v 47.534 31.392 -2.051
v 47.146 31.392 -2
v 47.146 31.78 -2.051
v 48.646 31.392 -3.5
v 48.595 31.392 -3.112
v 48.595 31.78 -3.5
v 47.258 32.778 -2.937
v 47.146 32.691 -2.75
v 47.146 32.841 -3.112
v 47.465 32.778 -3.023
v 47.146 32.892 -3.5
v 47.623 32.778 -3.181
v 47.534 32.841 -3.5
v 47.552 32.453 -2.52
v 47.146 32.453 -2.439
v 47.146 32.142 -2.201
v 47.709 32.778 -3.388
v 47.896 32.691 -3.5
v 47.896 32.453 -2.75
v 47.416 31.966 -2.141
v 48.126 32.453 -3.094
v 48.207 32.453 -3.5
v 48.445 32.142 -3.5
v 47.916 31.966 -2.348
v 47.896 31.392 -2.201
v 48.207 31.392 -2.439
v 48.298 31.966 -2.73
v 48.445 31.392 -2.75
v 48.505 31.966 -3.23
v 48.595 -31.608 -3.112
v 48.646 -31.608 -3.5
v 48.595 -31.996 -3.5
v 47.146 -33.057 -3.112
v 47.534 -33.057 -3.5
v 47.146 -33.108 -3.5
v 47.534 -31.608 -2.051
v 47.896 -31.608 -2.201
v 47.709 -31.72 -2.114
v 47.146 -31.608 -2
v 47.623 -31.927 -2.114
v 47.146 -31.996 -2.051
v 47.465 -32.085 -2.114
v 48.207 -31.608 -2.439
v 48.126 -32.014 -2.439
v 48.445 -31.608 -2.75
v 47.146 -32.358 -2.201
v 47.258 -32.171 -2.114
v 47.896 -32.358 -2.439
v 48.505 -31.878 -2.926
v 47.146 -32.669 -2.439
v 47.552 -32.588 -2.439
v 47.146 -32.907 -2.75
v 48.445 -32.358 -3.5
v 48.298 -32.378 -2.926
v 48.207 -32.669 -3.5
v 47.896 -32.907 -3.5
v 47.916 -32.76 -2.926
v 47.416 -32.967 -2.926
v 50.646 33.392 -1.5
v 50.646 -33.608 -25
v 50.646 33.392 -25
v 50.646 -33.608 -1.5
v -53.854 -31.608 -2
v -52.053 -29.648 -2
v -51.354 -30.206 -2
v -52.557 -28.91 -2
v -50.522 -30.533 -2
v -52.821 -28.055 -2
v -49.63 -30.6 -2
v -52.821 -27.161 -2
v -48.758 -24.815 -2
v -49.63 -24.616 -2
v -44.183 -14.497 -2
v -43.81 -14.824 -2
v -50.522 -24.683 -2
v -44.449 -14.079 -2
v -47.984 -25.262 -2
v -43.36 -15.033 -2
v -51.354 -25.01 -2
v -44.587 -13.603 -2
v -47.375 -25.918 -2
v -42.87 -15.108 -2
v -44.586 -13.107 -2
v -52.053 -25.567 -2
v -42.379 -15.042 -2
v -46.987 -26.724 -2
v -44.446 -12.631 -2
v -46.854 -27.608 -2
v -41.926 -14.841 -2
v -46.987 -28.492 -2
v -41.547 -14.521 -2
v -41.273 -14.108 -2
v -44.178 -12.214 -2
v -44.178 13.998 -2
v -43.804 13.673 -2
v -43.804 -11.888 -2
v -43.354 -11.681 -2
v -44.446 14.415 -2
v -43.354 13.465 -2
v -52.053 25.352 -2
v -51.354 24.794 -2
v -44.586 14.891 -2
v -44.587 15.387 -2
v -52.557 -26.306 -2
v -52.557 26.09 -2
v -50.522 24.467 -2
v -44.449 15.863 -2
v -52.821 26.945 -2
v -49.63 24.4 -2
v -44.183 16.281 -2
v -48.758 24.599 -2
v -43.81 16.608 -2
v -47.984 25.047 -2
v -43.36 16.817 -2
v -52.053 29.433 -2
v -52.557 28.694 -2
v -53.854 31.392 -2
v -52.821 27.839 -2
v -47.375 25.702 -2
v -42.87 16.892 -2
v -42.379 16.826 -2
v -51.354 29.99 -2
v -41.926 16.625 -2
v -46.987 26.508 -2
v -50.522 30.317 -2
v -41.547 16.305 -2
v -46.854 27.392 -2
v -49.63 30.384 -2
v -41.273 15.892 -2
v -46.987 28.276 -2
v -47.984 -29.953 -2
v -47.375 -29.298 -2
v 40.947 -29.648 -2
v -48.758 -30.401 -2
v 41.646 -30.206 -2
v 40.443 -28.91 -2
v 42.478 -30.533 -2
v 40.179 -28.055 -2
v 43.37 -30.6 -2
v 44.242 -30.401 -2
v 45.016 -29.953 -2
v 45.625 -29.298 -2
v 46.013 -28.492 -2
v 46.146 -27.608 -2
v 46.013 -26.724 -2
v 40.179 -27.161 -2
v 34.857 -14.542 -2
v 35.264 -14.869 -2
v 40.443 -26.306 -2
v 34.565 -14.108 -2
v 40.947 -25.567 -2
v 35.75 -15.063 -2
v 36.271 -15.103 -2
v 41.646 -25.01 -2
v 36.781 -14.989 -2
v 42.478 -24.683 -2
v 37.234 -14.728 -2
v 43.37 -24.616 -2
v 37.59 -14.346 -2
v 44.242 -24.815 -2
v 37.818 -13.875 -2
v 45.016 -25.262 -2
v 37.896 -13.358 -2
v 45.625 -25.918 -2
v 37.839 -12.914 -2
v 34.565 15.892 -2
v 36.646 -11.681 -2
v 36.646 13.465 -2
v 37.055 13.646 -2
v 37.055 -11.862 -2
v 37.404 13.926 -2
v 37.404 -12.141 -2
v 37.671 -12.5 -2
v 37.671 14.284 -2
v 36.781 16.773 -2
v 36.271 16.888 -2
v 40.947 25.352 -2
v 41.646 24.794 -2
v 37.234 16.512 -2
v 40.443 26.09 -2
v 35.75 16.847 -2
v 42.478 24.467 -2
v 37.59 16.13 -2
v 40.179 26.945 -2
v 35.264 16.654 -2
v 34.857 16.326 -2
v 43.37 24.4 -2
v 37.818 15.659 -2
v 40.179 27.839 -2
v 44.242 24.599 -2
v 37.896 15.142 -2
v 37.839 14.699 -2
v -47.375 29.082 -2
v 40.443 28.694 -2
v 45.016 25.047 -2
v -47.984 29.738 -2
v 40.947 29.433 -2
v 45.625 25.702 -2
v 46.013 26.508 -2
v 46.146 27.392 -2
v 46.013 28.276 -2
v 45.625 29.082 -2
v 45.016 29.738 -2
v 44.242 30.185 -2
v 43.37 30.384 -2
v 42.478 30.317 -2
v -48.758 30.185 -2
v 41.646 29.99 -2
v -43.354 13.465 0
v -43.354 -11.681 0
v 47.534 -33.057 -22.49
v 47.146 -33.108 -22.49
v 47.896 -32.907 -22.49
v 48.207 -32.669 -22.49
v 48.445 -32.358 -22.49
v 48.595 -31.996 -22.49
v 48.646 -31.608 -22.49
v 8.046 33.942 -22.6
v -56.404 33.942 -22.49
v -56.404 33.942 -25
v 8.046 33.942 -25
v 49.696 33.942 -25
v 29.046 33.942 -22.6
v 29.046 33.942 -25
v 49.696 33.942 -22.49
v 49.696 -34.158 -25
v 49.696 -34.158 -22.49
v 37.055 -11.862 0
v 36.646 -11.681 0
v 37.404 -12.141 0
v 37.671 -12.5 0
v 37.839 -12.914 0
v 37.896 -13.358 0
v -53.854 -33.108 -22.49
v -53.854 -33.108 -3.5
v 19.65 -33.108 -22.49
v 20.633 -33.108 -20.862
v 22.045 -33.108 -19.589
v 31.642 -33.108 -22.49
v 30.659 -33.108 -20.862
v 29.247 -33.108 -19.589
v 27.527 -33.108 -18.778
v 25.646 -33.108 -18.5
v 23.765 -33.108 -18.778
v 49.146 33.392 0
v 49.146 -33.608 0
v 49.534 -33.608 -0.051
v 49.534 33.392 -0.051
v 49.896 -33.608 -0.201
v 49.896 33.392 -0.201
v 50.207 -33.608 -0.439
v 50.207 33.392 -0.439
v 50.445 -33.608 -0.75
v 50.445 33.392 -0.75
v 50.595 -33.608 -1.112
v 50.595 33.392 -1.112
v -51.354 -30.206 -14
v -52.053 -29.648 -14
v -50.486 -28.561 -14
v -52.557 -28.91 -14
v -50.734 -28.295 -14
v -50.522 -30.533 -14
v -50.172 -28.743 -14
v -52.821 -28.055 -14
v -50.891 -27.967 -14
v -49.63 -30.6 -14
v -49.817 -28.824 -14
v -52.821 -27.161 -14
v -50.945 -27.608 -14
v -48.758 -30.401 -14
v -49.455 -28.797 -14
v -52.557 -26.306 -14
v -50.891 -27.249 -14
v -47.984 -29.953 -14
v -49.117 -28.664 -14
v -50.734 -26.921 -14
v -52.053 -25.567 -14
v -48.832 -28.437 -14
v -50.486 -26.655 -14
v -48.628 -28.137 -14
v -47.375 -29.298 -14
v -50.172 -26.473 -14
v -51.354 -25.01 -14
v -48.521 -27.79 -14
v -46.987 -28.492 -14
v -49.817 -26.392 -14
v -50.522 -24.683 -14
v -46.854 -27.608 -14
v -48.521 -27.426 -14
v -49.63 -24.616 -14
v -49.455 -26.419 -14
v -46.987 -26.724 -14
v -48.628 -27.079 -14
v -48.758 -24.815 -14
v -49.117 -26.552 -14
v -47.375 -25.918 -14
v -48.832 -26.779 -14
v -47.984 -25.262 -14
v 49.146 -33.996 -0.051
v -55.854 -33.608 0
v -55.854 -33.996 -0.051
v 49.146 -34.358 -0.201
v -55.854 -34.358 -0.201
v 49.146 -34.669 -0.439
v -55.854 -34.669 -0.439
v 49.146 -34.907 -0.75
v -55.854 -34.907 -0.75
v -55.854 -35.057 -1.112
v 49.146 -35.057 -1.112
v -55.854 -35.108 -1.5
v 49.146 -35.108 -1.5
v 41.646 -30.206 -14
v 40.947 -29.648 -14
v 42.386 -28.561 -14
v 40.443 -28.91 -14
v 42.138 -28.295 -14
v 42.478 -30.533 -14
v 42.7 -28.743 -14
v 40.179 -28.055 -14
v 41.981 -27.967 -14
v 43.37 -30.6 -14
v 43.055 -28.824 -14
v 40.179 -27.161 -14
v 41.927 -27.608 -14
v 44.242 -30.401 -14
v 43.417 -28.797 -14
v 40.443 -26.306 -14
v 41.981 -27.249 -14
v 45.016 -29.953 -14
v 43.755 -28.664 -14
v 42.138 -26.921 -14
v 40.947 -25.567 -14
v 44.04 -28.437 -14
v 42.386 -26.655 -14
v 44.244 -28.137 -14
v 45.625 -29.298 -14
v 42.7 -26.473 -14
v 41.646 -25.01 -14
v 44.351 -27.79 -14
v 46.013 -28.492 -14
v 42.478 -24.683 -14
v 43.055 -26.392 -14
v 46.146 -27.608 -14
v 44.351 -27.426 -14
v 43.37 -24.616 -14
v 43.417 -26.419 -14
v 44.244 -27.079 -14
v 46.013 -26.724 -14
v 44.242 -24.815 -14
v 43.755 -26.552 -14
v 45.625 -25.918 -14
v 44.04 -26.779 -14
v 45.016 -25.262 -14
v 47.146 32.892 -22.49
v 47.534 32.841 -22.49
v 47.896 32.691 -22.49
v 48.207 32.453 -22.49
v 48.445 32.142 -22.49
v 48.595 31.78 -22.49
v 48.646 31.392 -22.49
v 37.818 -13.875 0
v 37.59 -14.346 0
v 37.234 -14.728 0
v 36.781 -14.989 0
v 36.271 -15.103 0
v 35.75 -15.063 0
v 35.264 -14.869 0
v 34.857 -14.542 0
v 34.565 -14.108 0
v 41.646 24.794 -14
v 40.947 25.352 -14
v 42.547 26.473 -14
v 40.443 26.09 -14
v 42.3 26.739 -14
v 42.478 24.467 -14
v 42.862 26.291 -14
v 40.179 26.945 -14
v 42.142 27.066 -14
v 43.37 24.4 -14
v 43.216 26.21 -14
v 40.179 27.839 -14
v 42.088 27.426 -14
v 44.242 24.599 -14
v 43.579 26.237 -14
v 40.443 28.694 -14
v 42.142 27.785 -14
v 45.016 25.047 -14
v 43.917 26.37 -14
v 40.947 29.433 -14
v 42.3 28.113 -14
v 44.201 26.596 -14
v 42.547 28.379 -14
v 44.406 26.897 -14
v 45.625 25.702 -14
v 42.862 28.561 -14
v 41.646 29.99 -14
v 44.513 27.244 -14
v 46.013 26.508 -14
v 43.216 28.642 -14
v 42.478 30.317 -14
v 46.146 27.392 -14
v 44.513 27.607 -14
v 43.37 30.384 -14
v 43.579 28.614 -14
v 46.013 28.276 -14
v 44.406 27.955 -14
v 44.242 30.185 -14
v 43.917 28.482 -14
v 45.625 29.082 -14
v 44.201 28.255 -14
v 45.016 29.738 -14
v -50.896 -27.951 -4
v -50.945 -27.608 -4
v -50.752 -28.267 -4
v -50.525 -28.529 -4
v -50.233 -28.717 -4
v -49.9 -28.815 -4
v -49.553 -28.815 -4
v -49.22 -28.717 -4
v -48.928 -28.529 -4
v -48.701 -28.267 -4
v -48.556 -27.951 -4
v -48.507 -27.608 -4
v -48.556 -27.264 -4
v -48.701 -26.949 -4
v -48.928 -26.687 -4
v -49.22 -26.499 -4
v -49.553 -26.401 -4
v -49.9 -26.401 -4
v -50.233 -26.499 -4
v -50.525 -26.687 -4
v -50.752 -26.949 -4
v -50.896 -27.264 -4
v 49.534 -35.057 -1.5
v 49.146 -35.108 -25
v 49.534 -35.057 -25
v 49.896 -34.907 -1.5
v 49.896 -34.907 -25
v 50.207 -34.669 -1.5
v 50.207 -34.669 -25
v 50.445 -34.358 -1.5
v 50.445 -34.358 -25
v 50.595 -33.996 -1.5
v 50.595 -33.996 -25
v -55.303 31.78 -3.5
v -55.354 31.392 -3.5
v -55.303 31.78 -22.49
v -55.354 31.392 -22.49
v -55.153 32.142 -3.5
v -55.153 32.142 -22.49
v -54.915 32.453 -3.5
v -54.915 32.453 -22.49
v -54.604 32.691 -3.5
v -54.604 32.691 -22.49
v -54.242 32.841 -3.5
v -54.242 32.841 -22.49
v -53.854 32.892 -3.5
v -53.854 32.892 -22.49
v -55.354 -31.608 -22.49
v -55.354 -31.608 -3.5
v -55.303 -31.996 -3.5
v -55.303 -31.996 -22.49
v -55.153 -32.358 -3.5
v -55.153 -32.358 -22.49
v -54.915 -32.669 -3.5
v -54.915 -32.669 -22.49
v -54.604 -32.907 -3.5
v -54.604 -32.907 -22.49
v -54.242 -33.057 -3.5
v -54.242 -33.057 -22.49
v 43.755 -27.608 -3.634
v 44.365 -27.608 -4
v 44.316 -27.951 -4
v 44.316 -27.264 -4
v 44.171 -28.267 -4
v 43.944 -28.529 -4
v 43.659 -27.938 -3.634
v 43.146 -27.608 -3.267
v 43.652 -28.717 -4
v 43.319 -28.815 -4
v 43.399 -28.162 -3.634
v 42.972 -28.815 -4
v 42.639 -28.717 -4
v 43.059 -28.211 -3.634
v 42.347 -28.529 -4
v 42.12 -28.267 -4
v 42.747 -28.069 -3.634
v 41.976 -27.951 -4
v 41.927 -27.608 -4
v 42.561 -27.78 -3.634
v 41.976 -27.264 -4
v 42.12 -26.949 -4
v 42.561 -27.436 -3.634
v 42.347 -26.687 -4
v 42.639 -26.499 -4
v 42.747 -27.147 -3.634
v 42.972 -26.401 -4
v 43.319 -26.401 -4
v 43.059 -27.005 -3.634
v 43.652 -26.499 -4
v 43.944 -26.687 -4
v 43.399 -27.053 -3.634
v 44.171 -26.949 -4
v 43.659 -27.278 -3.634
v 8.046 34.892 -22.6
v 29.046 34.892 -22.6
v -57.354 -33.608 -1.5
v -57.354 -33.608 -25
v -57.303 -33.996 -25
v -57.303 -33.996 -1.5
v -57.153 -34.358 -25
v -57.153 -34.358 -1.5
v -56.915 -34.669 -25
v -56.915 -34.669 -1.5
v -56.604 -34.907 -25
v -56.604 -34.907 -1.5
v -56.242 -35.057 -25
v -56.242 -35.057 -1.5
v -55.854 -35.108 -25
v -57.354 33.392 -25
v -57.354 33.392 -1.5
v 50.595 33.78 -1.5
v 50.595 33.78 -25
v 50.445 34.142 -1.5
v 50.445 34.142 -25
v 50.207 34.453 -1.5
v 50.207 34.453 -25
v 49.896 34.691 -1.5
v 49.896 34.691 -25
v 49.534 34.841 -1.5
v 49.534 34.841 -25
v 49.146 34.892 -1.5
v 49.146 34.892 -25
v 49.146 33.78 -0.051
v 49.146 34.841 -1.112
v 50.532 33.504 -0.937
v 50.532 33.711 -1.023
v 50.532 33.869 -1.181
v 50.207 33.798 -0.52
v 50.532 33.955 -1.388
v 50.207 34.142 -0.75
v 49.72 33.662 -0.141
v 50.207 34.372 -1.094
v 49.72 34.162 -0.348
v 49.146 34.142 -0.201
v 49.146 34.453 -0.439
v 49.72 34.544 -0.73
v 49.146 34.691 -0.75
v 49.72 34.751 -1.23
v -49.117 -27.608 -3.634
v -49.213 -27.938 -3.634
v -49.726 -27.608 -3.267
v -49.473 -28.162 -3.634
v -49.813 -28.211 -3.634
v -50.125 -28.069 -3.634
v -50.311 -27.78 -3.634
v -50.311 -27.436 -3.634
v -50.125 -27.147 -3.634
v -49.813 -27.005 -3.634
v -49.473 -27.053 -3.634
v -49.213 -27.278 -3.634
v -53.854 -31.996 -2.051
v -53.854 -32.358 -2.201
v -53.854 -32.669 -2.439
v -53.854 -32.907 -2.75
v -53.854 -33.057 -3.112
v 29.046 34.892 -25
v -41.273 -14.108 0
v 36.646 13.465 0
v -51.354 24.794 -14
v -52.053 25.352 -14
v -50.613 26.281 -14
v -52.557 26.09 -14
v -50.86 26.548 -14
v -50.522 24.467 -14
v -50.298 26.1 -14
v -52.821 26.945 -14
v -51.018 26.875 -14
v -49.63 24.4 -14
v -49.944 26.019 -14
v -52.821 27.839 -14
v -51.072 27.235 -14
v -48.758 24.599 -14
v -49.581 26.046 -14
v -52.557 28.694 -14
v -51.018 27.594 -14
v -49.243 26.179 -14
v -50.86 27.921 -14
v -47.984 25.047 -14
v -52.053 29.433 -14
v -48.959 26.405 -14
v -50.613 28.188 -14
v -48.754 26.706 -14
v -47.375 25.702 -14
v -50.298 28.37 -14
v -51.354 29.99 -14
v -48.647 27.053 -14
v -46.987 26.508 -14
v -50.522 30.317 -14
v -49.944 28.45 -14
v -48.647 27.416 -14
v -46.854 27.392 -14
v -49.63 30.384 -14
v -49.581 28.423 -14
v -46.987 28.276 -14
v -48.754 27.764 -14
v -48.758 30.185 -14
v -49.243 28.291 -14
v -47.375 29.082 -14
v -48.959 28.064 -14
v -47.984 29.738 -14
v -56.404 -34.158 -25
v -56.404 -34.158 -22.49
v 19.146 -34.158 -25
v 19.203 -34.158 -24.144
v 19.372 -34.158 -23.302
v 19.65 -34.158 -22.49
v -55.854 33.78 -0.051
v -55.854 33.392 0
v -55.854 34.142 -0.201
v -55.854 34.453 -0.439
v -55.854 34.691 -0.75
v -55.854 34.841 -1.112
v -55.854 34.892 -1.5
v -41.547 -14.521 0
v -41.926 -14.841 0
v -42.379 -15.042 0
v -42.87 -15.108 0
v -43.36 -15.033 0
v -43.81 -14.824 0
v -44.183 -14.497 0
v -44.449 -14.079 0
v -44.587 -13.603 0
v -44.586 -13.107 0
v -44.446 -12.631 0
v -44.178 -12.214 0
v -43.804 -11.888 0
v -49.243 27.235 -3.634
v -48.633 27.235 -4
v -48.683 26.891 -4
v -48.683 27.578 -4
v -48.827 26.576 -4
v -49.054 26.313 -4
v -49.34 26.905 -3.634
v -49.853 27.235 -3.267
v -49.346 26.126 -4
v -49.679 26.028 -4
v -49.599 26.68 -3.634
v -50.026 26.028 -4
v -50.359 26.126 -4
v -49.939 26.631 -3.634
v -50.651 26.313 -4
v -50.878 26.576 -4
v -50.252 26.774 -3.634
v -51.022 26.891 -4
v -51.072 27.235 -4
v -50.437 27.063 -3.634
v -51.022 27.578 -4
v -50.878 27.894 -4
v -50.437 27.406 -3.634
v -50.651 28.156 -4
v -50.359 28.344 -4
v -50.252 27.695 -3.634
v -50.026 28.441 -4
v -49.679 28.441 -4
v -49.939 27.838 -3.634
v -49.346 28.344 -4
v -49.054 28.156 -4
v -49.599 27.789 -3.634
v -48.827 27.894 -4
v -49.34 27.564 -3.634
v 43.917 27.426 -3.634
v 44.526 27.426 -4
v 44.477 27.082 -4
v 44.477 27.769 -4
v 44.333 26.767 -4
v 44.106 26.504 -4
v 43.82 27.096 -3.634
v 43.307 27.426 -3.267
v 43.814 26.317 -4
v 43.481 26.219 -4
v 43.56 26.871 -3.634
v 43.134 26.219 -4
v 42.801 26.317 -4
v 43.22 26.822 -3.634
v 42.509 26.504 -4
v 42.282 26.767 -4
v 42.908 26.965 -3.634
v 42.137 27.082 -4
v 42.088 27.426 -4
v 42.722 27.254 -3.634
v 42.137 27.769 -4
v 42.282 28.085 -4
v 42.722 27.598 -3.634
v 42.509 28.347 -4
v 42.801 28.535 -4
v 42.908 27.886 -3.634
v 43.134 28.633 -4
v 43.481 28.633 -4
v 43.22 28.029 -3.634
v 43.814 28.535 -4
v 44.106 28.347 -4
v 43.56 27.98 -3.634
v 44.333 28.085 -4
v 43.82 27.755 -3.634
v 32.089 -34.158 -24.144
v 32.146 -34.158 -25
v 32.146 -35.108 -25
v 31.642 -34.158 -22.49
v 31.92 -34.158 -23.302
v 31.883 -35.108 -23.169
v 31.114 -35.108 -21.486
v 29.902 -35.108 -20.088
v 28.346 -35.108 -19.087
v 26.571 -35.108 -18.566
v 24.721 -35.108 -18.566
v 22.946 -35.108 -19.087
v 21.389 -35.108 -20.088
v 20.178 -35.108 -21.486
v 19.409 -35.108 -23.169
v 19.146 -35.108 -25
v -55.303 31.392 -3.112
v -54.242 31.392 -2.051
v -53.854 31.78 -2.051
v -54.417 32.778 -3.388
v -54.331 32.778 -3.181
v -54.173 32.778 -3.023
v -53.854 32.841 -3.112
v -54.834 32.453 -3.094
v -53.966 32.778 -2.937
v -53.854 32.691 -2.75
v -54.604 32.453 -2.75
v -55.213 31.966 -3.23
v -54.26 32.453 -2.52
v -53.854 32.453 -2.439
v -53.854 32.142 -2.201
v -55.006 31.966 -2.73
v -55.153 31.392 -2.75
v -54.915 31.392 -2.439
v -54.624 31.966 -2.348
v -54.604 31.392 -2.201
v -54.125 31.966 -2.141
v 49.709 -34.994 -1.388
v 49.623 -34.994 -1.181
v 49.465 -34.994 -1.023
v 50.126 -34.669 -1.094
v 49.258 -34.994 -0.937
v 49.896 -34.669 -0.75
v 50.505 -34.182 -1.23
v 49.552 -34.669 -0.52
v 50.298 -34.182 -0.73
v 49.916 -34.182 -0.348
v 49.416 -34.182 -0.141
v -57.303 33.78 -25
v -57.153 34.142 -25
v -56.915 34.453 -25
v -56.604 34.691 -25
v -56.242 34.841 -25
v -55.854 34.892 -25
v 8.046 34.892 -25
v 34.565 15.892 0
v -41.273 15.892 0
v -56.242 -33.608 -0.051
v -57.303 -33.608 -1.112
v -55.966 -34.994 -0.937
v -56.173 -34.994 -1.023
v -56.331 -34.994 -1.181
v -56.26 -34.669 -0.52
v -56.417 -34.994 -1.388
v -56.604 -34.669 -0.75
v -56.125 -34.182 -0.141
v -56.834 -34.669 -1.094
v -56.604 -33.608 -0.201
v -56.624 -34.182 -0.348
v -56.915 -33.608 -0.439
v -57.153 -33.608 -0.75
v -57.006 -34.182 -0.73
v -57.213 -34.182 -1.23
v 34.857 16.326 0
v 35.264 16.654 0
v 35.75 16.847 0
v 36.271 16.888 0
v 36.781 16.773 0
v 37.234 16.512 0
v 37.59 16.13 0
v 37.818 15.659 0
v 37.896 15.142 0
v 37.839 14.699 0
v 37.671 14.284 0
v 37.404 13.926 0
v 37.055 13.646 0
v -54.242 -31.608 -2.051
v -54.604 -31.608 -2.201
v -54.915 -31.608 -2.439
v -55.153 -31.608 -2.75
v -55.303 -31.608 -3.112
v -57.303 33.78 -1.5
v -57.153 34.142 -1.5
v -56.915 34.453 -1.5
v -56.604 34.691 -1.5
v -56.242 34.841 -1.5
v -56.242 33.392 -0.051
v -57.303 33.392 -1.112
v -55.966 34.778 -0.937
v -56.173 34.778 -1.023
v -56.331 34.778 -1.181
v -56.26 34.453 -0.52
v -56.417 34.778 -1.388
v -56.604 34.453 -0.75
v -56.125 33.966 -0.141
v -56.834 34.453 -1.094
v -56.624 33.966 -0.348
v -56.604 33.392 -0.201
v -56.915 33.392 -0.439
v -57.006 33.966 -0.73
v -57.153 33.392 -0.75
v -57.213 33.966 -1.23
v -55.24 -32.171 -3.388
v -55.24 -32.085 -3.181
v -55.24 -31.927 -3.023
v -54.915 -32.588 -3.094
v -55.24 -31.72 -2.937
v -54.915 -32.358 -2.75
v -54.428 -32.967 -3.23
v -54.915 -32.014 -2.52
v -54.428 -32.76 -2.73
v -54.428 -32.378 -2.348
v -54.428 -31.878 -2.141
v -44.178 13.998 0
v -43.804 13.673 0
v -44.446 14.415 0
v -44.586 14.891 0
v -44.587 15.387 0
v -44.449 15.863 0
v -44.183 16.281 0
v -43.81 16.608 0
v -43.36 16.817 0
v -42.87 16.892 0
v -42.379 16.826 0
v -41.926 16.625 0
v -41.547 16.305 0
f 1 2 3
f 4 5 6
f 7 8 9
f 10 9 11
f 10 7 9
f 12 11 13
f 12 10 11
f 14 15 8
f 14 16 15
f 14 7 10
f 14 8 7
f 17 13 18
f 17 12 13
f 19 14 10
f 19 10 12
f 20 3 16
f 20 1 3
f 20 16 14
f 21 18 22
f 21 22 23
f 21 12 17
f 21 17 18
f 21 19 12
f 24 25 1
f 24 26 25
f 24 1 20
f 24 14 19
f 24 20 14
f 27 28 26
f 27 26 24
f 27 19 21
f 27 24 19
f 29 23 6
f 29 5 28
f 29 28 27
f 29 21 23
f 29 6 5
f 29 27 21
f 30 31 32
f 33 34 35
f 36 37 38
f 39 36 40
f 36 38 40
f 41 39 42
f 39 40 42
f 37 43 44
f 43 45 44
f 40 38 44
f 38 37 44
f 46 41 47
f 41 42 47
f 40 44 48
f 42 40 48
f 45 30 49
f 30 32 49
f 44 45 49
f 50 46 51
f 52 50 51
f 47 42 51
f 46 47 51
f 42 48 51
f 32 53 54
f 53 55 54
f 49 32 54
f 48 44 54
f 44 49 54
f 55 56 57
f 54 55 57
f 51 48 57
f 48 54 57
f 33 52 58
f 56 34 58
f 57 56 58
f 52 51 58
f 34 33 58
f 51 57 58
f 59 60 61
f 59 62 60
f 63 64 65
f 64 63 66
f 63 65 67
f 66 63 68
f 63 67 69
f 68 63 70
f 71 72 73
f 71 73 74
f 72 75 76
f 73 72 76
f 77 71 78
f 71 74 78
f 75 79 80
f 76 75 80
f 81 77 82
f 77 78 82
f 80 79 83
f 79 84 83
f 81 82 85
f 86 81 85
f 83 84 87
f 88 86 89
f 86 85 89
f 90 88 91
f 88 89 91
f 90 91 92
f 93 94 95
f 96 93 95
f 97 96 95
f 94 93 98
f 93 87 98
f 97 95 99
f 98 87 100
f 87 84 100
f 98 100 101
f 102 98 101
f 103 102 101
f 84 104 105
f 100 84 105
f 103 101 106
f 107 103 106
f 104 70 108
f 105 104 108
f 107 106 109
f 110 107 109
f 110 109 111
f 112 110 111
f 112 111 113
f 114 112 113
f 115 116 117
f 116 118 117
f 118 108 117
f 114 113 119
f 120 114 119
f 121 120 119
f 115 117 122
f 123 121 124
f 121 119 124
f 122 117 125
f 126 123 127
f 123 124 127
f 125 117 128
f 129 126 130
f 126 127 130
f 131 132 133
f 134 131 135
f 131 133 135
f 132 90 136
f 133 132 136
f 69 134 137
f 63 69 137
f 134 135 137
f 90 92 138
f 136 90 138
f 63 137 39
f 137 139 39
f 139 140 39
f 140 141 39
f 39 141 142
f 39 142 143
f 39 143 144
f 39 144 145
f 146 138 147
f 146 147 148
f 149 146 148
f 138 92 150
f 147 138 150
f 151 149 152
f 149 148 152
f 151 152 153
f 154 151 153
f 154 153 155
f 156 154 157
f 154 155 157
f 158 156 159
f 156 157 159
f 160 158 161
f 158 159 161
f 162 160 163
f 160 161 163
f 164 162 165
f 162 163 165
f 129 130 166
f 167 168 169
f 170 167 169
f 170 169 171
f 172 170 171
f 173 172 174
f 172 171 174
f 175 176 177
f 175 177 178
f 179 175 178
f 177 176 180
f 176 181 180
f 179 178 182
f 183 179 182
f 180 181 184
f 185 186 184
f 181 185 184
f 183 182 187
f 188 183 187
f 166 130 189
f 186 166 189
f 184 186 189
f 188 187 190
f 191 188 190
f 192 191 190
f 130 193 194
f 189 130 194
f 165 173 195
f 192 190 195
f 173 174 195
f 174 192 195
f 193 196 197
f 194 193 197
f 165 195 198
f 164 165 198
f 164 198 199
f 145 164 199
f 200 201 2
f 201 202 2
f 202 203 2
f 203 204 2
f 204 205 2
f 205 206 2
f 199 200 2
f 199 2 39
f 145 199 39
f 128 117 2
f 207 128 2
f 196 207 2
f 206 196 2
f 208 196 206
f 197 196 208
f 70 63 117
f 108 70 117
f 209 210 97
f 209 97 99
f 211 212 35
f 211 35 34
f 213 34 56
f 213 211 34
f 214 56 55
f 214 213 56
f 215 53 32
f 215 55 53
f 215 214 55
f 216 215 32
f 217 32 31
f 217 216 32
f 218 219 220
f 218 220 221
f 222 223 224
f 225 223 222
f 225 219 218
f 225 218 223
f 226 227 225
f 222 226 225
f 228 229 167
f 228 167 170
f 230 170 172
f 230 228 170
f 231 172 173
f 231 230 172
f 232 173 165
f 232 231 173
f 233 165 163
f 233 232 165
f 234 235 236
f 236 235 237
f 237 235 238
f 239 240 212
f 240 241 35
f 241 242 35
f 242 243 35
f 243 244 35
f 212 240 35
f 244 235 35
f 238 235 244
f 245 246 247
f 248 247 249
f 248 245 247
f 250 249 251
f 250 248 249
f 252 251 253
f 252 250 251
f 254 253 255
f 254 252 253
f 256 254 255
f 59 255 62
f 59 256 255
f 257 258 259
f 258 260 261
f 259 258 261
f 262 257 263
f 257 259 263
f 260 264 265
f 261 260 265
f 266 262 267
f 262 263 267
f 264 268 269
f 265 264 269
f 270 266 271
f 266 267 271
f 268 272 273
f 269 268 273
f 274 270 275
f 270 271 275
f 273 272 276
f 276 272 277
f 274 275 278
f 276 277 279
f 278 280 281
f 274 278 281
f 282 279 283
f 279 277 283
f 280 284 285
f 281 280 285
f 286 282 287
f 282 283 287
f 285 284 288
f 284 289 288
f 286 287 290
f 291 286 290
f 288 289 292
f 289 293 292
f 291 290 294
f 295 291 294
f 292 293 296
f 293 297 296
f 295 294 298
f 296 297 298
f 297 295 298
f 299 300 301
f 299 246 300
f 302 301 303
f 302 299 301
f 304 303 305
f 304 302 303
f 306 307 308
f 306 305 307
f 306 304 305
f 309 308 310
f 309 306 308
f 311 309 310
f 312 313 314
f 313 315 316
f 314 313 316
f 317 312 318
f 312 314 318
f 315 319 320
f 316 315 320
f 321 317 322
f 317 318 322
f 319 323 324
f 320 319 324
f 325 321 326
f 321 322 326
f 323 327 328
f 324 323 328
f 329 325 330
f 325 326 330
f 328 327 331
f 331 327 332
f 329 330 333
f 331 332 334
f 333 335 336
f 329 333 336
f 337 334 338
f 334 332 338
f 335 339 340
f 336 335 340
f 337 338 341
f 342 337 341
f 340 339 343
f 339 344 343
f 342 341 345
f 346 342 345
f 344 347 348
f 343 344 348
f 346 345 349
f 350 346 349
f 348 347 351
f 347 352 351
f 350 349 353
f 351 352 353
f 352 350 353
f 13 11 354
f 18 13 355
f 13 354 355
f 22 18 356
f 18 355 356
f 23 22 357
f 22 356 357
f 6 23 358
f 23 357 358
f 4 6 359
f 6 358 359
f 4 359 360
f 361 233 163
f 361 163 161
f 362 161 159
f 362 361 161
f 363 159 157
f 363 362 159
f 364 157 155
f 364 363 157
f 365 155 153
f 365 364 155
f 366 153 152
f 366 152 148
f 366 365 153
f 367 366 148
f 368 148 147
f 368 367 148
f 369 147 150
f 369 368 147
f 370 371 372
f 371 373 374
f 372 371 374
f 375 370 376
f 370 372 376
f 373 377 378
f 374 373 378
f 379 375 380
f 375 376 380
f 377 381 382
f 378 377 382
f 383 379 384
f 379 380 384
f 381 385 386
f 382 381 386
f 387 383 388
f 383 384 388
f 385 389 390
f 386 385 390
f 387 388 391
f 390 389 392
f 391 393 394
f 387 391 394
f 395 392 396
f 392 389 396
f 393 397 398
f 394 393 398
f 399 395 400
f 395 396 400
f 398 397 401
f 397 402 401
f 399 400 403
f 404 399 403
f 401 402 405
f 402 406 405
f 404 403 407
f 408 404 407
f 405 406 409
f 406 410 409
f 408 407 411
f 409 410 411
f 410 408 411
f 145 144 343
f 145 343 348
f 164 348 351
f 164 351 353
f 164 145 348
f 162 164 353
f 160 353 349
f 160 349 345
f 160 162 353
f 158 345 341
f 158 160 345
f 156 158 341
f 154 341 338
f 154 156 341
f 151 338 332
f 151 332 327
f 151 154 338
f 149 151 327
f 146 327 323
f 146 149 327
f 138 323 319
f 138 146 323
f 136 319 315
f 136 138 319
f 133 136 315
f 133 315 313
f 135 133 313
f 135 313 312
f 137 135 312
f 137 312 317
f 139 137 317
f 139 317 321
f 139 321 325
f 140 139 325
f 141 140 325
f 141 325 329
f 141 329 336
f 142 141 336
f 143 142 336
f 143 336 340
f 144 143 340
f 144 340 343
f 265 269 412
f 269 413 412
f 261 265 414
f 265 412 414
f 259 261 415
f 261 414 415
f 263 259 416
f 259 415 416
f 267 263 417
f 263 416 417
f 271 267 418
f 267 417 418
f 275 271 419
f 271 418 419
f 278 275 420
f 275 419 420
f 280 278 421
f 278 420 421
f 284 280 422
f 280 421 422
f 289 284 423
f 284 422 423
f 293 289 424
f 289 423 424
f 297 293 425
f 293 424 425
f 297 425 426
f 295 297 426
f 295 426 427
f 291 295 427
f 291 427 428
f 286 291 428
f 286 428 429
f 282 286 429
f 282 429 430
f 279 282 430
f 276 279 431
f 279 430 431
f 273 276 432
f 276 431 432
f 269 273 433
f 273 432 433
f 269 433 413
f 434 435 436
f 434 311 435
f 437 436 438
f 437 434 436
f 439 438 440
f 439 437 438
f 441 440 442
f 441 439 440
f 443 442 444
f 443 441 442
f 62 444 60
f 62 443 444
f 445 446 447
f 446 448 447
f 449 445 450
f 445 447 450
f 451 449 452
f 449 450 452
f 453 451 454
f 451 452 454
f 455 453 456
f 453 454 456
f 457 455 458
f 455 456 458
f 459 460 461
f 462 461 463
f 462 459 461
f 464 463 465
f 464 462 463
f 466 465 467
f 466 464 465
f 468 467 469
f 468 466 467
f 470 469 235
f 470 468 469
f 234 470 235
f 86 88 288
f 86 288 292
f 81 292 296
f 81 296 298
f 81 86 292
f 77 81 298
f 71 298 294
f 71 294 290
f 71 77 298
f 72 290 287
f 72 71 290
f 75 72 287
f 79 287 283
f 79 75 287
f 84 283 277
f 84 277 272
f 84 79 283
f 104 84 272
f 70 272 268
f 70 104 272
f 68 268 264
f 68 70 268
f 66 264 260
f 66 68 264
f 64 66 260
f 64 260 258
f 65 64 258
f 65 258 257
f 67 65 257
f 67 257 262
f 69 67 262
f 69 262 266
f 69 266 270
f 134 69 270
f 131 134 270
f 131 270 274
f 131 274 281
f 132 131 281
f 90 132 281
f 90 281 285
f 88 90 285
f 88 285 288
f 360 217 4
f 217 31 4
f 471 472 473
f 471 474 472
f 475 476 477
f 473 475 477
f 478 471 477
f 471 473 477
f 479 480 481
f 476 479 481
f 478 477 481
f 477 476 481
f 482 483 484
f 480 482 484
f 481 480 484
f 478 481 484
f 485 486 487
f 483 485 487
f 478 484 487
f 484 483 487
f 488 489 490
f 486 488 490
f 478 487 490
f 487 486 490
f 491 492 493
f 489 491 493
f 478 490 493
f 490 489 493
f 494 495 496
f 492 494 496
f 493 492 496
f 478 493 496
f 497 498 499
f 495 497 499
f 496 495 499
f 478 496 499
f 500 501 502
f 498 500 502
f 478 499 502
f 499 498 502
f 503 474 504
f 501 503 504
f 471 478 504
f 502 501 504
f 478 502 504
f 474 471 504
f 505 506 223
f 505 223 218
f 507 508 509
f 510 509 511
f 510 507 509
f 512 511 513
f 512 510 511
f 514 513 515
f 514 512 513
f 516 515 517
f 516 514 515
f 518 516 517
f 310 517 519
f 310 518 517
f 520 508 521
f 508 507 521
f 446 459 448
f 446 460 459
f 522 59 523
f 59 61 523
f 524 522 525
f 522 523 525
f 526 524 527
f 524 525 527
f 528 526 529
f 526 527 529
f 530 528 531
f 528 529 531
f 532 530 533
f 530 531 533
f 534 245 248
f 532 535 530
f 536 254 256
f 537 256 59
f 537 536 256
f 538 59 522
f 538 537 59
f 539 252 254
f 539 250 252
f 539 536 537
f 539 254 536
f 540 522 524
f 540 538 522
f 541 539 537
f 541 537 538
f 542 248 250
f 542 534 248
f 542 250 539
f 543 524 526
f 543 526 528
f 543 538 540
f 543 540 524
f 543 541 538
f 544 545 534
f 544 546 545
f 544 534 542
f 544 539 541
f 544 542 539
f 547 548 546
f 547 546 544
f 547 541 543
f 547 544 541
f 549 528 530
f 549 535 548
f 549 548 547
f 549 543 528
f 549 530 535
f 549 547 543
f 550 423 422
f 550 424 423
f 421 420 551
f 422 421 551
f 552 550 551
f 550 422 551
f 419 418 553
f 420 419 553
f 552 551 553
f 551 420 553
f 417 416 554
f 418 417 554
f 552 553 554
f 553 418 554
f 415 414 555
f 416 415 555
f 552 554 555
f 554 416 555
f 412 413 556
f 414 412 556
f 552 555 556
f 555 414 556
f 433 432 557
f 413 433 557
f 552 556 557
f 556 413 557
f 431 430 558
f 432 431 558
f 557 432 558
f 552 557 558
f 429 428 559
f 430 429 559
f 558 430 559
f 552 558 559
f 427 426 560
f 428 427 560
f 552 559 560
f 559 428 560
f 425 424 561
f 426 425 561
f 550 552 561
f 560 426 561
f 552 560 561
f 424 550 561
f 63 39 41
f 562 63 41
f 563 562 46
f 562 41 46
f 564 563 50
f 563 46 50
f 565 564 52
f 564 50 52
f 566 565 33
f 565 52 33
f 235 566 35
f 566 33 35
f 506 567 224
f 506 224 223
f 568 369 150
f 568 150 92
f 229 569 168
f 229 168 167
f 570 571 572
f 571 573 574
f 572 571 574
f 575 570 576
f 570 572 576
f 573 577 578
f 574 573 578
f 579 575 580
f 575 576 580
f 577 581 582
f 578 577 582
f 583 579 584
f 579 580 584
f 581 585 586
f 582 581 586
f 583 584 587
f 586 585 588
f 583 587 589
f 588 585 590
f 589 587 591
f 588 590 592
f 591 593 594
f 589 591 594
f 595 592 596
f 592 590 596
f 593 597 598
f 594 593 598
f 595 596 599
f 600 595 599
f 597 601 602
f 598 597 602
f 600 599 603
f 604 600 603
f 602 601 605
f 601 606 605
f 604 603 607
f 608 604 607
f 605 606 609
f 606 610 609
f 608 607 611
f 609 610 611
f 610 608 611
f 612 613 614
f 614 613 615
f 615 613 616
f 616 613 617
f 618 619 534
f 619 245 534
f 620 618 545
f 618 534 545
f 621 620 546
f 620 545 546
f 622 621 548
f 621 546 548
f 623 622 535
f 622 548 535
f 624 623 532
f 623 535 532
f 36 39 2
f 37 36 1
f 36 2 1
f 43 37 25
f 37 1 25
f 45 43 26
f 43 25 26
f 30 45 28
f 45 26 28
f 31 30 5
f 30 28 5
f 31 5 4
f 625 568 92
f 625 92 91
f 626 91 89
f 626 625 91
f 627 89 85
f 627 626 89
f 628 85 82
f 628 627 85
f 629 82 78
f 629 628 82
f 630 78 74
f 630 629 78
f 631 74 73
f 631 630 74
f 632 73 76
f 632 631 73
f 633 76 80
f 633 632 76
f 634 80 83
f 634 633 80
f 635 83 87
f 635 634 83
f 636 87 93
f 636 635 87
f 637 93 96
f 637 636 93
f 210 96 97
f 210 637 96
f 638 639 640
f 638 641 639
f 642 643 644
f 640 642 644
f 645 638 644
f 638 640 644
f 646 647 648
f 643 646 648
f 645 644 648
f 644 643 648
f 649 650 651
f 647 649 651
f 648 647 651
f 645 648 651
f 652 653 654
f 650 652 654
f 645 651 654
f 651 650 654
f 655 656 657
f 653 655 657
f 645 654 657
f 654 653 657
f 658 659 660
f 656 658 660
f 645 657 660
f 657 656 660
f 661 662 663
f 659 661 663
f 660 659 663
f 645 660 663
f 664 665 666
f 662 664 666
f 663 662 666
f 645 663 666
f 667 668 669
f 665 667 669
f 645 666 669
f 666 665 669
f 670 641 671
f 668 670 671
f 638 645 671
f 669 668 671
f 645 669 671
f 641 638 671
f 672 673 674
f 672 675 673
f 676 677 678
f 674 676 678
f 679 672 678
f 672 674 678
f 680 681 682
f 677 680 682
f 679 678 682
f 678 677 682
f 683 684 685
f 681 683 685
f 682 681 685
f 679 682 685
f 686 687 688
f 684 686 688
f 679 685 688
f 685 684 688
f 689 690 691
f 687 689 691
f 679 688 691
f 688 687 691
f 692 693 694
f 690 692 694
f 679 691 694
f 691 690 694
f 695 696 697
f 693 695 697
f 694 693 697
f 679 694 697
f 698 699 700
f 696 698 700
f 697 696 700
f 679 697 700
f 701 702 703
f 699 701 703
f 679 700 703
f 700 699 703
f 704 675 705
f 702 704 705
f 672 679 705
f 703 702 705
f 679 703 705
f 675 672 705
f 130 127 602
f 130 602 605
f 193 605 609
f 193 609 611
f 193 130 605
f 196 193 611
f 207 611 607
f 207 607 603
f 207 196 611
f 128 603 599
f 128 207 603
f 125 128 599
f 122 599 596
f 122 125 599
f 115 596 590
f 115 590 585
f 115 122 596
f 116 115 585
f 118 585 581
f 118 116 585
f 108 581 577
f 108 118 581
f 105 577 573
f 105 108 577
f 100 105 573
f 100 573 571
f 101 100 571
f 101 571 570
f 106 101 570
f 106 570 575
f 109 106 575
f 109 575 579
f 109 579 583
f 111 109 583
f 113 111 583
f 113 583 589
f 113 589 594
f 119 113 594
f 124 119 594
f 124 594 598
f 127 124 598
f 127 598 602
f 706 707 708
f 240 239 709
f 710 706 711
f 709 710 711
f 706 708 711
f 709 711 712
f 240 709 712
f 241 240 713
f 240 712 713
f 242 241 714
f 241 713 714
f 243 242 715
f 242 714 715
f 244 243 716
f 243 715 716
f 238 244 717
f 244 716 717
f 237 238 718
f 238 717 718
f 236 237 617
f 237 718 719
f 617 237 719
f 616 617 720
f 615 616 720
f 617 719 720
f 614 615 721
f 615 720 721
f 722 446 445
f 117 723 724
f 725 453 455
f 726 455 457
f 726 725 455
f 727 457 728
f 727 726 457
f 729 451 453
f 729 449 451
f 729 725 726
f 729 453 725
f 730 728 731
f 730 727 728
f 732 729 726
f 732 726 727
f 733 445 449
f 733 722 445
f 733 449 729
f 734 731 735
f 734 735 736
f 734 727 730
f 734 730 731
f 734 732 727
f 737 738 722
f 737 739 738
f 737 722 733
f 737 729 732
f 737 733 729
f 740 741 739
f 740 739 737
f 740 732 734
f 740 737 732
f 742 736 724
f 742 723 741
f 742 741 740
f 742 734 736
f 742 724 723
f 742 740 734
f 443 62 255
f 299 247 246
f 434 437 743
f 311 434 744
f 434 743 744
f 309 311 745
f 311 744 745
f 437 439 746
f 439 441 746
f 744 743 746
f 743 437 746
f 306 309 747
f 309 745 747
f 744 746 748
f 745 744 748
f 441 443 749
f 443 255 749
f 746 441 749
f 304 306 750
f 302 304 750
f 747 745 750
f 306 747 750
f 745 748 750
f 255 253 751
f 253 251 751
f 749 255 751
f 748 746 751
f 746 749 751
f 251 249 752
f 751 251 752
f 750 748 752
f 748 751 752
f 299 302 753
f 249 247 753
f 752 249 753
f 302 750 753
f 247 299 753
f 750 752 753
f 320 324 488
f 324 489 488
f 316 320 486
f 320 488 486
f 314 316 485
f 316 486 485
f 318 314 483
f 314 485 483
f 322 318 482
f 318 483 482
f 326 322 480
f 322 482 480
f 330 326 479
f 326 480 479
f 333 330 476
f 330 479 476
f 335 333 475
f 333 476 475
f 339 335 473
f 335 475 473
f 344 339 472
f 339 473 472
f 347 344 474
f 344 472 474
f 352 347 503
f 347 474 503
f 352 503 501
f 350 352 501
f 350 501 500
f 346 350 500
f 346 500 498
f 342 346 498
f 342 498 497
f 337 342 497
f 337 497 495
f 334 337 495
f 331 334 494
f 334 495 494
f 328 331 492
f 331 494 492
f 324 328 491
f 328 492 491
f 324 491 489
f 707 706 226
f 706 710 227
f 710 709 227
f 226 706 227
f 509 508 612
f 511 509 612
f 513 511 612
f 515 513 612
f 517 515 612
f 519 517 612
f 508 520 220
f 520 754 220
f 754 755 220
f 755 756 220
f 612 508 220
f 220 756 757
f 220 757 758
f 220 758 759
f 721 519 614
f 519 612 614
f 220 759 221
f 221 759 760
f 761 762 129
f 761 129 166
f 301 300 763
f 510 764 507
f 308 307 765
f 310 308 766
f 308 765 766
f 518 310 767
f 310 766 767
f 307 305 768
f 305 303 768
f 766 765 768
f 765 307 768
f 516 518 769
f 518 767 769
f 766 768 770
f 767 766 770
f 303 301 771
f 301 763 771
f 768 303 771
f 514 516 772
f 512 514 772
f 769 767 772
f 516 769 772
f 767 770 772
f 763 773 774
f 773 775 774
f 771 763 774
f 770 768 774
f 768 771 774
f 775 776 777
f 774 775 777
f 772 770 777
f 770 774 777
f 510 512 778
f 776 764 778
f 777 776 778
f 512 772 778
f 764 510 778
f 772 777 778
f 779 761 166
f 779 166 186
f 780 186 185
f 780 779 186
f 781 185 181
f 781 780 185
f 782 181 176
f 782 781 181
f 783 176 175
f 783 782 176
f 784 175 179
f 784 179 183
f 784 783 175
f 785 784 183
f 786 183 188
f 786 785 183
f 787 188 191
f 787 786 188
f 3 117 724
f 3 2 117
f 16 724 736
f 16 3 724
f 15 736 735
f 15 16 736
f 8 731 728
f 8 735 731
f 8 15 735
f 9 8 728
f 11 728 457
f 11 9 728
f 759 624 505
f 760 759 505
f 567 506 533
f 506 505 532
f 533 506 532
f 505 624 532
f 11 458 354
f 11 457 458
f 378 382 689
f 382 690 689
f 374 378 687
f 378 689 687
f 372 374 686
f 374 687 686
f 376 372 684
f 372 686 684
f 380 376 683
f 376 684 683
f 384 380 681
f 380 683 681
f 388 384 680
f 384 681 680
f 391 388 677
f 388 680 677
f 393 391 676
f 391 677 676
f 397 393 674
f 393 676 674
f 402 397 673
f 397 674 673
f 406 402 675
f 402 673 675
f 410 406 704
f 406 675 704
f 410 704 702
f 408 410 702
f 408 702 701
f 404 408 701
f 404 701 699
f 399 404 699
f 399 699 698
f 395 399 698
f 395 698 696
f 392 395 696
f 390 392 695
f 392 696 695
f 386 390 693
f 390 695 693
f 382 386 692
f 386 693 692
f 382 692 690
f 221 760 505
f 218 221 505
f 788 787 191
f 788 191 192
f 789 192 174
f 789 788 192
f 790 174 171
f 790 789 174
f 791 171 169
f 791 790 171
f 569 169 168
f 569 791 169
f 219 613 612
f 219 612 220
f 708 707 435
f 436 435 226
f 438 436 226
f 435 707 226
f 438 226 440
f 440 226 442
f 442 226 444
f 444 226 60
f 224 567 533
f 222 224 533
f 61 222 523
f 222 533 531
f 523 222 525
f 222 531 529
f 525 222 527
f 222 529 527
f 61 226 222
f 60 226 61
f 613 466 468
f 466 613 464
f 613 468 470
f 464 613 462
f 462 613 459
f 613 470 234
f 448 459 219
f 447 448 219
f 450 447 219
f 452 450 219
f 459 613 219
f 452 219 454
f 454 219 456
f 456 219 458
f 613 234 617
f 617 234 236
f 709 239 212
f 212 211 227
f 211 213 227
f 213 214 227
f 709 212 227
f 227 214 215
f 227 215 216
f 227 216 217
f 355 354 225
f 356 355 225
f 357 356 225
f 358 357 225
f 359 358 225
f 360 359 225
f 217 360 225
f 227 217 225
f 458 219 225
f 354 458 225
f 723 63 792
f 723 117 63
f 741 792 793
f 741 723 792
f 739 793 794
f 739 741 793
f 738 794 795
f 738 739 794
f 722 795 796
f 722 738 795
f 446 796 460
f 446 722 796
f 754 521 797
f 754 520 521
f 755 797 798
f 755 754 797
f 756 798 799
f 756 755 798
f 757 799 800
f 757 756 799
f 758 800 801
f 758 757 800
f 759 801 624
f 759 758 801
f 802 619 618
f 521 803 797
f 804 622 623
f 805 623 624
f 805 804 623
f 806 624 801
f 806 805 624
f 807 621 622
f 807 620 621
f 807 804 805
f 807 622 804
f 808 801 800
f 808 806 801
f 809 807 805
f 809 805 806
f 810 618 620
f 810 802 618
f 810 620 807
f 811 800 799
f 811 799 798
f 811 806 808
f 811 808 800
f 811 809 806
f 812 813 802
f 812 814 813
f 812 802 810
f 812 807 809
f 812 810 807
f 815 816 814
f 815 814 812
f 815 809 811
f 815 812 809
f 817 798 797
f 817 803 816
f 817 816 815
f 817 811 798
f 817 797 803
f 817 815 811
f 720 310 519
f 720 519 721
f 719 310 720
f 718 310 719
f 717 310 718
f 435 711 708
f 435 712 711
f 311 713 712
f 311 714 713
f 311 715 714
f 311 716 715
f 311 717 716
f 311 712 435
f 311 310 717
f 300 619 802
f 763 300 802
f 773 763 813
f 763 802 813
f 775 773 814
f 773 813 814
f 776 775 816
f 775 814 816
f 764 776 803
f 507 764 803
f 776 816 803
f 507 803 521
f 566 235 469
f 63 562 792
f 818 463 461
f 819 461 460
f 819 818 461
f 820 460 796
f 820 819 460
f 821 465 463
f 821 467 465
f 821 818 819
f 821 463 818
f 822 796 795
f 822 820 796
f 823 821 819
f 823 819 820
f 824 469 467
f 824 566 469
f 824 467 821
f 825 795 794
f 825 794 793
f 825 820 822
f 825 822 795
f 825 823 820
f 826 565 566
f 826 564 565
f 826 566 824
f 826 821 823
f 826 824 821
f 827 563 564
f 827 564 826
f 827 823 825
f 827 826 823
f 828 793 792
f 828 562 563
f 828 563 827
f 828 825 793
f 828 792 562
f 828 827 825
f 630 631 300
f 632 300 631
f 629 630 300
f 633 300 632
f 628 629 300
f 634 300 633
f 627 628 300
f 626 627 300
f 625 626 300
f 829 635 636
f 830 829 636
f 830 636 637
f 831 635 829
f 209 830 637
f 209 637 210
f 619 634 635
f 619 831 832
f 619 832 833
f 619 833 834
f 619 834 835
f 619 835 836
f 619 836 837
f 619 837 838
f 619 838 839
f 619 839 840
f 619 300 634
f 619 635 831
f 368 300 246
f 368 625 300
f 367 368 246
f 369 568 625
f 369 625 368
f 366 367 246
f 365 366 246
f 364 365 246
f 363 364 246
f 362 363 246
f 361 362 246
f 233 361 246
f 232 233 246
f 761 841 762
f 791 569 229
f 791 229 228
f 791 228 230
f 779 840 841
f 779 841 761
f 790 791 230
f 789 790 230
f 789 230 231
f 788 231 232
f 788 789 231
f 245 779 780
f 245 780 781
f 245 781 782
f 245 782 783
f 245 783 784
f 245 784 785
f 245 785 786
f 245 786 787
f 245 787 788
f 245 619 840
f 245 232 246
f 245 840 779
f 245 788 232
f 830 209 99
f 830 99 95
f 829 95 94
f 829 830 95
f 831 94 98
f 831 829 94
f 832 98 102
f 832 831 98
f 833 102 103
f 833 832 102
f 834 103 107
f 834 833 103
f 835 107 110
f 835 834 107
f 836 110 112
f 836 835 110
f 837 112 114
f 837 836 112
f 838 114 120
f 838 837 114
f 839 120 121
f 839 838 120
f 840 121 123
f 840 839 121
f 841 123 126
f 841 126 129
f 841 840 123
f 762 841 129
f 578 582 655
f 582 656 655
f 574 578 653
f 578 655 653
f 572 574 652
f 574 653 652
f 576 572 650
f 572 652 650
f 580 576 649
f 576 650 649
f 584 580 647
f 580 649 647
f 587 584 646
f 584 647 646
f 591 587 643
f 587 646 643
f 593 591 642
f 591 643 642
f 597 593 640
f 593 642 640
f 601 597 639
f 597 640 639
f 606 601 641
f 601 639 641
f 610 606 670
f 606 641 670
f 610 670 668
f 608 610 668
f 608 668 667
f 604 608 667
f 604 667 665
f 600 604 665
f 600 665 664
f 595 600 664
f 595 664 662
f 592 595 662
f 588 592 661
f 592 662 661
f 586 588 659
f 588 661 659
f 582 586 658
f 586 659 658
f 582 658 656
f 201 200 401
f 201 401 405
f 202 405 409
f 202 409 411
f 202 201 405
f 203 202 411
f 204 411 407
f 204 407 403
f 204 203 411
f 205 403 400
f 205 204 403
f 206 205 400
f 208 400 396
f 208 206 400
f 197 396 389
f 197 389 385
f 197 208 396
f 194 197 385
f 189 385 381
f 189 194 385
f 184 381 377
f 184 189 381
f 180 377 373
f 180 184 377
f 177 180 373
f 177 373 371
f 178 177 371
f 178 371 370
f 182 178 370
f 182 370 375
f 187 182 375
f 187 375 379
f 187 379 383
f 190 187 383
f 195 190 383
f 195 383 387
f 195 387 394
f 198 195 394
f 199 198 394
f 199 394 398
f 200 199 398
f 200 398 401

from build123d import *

# Parameters (mm, degrees)
F0_W      = 108
F0_H      = 70
F0_W_2    = 106.1
F0_H_2    = 68.1
F0_W_3    = 104
F0_H_3    = 66
F0_R      = 3
F1_DEPTH  = 2
F2_DEPTH  = 22.49
F3_DEPTH  = 23
F4_DEPTH  = 14
F6_DEPTH  = 2.5
F7_W      = 21
F7_H      = 2.4
F8_DEPTH  = 2.5
F10_D     = 2.4384
F10_DEPTH = 10
F10_TIP   = 0.7325692667
F11_R     = 1.5
F12_R     = 1.5


with BuildPart() as f1:
    # F0 (on Top) → F1 (new body)
    with BuildSketch(Plane.XY):
        with Locations((-3.3541592062, -0.1079301417)):
            Rectangle(F0_W, F0_H)
        with Locations((-3.3541592062, -0.1079301417)):
            Rectangle(F0_W_2, F0_H_2, mode=Mode.SUBTRACT)
        with Locations((-3.3541592062, -0.1079301417)):
            Rectangle(F0_W_2, F0_H_2)
        with Locations((-3.3541592062, -0.1079301417)):
            Rectangle(F0_W_3, F0_H_3, mode=Mode.SUBTRACT)
        with Locations((-3.3541592062, -0.1079301417)):
            Rectangle(F0_W_3, F0_H_3)
        with Locations((-49.8541592062, -27.6079301417)):
            Circle(F0_R, mode=Mode.SUBTRACT)
        with Locations((43.1458407938, -27.6079301417)):
            Circle(F0_R, mode=Mode.SUBTRACT)
        with Locations((-49.8541592062, 27.3920698583)):
            Circle(F0_R, mode=Mode.SUBTRACT)
        with BuildLine():
            ThreePointArc((-43.3541592062, 13.4650188752), (-44.1826393193, 16.2812101433), (-41.2730203761, 15.8920698583))
            Line((-41.2730203761, 15.8920698583), (34.5647019638, 15.8920698583))
            ThreePointArc((34.5647019638, 15.8920698583), (36.5302279992, 16.8493327192), (37.8958407938, 15.1420698583))
            ThreePointArc((37.8958407938, 15.1420698583), (37.5489623139, 14.0962448251), (36.6458407938, 13.4650188752))
            Line((36.6458407938, 13.4650188752), (36.6458407938, -11.6808791586))
            ThreePointArc((36.6458407938, -11.6808791586), (37.5489623139, -12.3121051085), (37.8958407938, -13.3579301417))
            ThreePointArc((37.8958407938, -13.3579301417), (36.5302279992, -15.0651930026), (34.5647019638, -14.1079301417))
            Line((34.5647019638, -14.1079301417), (-41.2730203761, -14.1079301417))
            ThreePointArc((-41.2730203761, -14.1079301417), (-44.1826393193, -14.4970704267), (-43.3541592062, -11.6808791586))
            Line((-43.3541592062, -11.6808791586), (-43.3541592062, 13.4650188752))
        make_face(mode=Mode.SUBTRACT)
        with Locations((43.1458407938, 27.3920698583)):
            Circle(F0_R, mode=Mode.SUBTRACT)
        with Locations((-49.8541592062, 27.3920698583)):
            Circle(F0_R)
        with Locations((43.1458407938, 27.3920698583)):
            Circle(F0_R)
        with Locations((43.1458407938, -27.6079301417)):
            Circle(F0_R)
        with Locations((-49.8541592062, -27.6079301417)):
            Circle(F0_R)
    extrude(amount=-F1_DEPTH)

    # F0 (on Top) → F2 (join)
    with BuildSketch(Plane.XY):
        with Locations((-3.3541592062, -0.1079301417)):
            Rectangle(F0_W_2, F0_H_2)
        with Locations((-3.3541592062, -0.1079301417)):
            Rectangle(F0_W_3, F0_H_3, mode=Mode.SUBTRACT)
    extrude(amount=-F2_DEPTH)

    # F3 (add): a face of the model
    f3_faces = [f1.faces().sort_by_distance(p)[0] for p in [
        (50.5171395895, -0.1079301417, -2),
    ]]
    extrude(f3_faces, amount=F3_DEPTH)

    # F0 (on Top) → F4 (join)
    with BuildSketch(Plane.XY):
        with Locations((-49.8541592062, 27.3920698583)):
            Circle(F0_R)
        with Locations((43.1458407938, 27.3920698583)):
            Circle(F0_R)
        with Locations((-49.8541592062, -27.6079301417)):
            Circle(F0_R)
        with Locations((43.1458407938, -27.6079301417)):
            Circle(F0_R)
    extrude(amount=-F4_DEPTH)

    # F5 (on face) → F6 (cut)
    with BuildSketch(Plane.XZ.offset(35.1079301417)):
        with BuildLine():
            Line((19.1458407938, -25), (32.1458407938, -25))
            ThreePointArc((32.1458407938, -25), (25.6458407938, -18.5), (19.1458407938, -25))
        make_face()
    extrude(amount=-F6_DEPTH, mode=Mode.SUBTRACT)

    # F7 (on face) → F8 (cut)
    with BuildSketch(Plane(origin=(0, 34.8920698583, 0), x_dir=(-1, 0, 0), z_dir=(0, 1, 0))):
        with Locations((-18.5458407938, -23.8)):
            Rectangle(F7_W, F7_H)
    extrude(amount=-F8_DEPTH, mode=Mode.SUBTRACT)

    # F10
    with Locations(Plane(origin=(0, 0, -14), x_dir=(1, 0, 0), z_dir=(0, 0, -1))):
        with Locations((-49.8525463045, -27.2346809506), (43.3072187006, -27.4257659912), (43.1458407938, 27.6079301417), (-49.7261881828, 27.6079301417)):
            Hole(F10_D / 2, depth=F10_DEPTH)
            with Locations((0, 0, -(F10_DEPTH + F10_TIP / 2))):  # 118° drill point
                Cone(0, F10_D / 2, F10_TIP, mode=Mode.SUBTRACT)

    # F11
    f11_edges = [f1.edges().sort_by_distance(p)[0] for p in [
        (-57.354159, -0.10793, 0),
        (-3.354159, 34.89207, 0),
        (50.645841, -0.10793, 0),
        (50.645841, -35.10793, -12.5),
        (-3.354159, -35.10793, 0),
        (-57.354159, -35.10793, -12.5),
        (50.645841, 34.89207, -12.5),
        (-57.354159, 34.89207, -12.5),
    ]]
    fillet(f11_edges, radius=F11_R)

    # F12
    f12_edges = [f1.edges().sort_by_distance(p)[0] for p in [
        (48.645841, -33.10793, -12.245),
        (48.645841, -0.10793, -2),
        (-3.354159, -33.10793, -2),
        (-55.354159, -33.10793, -12.245),
        (-55.354159, -0.10793, -2),
        (-55.354159, 32.89207, -12.245),
        (-3.354159, 32.89207, -2),
        (48.645841, 32.89207, -12.245),
    ]]
    fillet(f12_edges, radius=F12_R)


solid = f1.part
